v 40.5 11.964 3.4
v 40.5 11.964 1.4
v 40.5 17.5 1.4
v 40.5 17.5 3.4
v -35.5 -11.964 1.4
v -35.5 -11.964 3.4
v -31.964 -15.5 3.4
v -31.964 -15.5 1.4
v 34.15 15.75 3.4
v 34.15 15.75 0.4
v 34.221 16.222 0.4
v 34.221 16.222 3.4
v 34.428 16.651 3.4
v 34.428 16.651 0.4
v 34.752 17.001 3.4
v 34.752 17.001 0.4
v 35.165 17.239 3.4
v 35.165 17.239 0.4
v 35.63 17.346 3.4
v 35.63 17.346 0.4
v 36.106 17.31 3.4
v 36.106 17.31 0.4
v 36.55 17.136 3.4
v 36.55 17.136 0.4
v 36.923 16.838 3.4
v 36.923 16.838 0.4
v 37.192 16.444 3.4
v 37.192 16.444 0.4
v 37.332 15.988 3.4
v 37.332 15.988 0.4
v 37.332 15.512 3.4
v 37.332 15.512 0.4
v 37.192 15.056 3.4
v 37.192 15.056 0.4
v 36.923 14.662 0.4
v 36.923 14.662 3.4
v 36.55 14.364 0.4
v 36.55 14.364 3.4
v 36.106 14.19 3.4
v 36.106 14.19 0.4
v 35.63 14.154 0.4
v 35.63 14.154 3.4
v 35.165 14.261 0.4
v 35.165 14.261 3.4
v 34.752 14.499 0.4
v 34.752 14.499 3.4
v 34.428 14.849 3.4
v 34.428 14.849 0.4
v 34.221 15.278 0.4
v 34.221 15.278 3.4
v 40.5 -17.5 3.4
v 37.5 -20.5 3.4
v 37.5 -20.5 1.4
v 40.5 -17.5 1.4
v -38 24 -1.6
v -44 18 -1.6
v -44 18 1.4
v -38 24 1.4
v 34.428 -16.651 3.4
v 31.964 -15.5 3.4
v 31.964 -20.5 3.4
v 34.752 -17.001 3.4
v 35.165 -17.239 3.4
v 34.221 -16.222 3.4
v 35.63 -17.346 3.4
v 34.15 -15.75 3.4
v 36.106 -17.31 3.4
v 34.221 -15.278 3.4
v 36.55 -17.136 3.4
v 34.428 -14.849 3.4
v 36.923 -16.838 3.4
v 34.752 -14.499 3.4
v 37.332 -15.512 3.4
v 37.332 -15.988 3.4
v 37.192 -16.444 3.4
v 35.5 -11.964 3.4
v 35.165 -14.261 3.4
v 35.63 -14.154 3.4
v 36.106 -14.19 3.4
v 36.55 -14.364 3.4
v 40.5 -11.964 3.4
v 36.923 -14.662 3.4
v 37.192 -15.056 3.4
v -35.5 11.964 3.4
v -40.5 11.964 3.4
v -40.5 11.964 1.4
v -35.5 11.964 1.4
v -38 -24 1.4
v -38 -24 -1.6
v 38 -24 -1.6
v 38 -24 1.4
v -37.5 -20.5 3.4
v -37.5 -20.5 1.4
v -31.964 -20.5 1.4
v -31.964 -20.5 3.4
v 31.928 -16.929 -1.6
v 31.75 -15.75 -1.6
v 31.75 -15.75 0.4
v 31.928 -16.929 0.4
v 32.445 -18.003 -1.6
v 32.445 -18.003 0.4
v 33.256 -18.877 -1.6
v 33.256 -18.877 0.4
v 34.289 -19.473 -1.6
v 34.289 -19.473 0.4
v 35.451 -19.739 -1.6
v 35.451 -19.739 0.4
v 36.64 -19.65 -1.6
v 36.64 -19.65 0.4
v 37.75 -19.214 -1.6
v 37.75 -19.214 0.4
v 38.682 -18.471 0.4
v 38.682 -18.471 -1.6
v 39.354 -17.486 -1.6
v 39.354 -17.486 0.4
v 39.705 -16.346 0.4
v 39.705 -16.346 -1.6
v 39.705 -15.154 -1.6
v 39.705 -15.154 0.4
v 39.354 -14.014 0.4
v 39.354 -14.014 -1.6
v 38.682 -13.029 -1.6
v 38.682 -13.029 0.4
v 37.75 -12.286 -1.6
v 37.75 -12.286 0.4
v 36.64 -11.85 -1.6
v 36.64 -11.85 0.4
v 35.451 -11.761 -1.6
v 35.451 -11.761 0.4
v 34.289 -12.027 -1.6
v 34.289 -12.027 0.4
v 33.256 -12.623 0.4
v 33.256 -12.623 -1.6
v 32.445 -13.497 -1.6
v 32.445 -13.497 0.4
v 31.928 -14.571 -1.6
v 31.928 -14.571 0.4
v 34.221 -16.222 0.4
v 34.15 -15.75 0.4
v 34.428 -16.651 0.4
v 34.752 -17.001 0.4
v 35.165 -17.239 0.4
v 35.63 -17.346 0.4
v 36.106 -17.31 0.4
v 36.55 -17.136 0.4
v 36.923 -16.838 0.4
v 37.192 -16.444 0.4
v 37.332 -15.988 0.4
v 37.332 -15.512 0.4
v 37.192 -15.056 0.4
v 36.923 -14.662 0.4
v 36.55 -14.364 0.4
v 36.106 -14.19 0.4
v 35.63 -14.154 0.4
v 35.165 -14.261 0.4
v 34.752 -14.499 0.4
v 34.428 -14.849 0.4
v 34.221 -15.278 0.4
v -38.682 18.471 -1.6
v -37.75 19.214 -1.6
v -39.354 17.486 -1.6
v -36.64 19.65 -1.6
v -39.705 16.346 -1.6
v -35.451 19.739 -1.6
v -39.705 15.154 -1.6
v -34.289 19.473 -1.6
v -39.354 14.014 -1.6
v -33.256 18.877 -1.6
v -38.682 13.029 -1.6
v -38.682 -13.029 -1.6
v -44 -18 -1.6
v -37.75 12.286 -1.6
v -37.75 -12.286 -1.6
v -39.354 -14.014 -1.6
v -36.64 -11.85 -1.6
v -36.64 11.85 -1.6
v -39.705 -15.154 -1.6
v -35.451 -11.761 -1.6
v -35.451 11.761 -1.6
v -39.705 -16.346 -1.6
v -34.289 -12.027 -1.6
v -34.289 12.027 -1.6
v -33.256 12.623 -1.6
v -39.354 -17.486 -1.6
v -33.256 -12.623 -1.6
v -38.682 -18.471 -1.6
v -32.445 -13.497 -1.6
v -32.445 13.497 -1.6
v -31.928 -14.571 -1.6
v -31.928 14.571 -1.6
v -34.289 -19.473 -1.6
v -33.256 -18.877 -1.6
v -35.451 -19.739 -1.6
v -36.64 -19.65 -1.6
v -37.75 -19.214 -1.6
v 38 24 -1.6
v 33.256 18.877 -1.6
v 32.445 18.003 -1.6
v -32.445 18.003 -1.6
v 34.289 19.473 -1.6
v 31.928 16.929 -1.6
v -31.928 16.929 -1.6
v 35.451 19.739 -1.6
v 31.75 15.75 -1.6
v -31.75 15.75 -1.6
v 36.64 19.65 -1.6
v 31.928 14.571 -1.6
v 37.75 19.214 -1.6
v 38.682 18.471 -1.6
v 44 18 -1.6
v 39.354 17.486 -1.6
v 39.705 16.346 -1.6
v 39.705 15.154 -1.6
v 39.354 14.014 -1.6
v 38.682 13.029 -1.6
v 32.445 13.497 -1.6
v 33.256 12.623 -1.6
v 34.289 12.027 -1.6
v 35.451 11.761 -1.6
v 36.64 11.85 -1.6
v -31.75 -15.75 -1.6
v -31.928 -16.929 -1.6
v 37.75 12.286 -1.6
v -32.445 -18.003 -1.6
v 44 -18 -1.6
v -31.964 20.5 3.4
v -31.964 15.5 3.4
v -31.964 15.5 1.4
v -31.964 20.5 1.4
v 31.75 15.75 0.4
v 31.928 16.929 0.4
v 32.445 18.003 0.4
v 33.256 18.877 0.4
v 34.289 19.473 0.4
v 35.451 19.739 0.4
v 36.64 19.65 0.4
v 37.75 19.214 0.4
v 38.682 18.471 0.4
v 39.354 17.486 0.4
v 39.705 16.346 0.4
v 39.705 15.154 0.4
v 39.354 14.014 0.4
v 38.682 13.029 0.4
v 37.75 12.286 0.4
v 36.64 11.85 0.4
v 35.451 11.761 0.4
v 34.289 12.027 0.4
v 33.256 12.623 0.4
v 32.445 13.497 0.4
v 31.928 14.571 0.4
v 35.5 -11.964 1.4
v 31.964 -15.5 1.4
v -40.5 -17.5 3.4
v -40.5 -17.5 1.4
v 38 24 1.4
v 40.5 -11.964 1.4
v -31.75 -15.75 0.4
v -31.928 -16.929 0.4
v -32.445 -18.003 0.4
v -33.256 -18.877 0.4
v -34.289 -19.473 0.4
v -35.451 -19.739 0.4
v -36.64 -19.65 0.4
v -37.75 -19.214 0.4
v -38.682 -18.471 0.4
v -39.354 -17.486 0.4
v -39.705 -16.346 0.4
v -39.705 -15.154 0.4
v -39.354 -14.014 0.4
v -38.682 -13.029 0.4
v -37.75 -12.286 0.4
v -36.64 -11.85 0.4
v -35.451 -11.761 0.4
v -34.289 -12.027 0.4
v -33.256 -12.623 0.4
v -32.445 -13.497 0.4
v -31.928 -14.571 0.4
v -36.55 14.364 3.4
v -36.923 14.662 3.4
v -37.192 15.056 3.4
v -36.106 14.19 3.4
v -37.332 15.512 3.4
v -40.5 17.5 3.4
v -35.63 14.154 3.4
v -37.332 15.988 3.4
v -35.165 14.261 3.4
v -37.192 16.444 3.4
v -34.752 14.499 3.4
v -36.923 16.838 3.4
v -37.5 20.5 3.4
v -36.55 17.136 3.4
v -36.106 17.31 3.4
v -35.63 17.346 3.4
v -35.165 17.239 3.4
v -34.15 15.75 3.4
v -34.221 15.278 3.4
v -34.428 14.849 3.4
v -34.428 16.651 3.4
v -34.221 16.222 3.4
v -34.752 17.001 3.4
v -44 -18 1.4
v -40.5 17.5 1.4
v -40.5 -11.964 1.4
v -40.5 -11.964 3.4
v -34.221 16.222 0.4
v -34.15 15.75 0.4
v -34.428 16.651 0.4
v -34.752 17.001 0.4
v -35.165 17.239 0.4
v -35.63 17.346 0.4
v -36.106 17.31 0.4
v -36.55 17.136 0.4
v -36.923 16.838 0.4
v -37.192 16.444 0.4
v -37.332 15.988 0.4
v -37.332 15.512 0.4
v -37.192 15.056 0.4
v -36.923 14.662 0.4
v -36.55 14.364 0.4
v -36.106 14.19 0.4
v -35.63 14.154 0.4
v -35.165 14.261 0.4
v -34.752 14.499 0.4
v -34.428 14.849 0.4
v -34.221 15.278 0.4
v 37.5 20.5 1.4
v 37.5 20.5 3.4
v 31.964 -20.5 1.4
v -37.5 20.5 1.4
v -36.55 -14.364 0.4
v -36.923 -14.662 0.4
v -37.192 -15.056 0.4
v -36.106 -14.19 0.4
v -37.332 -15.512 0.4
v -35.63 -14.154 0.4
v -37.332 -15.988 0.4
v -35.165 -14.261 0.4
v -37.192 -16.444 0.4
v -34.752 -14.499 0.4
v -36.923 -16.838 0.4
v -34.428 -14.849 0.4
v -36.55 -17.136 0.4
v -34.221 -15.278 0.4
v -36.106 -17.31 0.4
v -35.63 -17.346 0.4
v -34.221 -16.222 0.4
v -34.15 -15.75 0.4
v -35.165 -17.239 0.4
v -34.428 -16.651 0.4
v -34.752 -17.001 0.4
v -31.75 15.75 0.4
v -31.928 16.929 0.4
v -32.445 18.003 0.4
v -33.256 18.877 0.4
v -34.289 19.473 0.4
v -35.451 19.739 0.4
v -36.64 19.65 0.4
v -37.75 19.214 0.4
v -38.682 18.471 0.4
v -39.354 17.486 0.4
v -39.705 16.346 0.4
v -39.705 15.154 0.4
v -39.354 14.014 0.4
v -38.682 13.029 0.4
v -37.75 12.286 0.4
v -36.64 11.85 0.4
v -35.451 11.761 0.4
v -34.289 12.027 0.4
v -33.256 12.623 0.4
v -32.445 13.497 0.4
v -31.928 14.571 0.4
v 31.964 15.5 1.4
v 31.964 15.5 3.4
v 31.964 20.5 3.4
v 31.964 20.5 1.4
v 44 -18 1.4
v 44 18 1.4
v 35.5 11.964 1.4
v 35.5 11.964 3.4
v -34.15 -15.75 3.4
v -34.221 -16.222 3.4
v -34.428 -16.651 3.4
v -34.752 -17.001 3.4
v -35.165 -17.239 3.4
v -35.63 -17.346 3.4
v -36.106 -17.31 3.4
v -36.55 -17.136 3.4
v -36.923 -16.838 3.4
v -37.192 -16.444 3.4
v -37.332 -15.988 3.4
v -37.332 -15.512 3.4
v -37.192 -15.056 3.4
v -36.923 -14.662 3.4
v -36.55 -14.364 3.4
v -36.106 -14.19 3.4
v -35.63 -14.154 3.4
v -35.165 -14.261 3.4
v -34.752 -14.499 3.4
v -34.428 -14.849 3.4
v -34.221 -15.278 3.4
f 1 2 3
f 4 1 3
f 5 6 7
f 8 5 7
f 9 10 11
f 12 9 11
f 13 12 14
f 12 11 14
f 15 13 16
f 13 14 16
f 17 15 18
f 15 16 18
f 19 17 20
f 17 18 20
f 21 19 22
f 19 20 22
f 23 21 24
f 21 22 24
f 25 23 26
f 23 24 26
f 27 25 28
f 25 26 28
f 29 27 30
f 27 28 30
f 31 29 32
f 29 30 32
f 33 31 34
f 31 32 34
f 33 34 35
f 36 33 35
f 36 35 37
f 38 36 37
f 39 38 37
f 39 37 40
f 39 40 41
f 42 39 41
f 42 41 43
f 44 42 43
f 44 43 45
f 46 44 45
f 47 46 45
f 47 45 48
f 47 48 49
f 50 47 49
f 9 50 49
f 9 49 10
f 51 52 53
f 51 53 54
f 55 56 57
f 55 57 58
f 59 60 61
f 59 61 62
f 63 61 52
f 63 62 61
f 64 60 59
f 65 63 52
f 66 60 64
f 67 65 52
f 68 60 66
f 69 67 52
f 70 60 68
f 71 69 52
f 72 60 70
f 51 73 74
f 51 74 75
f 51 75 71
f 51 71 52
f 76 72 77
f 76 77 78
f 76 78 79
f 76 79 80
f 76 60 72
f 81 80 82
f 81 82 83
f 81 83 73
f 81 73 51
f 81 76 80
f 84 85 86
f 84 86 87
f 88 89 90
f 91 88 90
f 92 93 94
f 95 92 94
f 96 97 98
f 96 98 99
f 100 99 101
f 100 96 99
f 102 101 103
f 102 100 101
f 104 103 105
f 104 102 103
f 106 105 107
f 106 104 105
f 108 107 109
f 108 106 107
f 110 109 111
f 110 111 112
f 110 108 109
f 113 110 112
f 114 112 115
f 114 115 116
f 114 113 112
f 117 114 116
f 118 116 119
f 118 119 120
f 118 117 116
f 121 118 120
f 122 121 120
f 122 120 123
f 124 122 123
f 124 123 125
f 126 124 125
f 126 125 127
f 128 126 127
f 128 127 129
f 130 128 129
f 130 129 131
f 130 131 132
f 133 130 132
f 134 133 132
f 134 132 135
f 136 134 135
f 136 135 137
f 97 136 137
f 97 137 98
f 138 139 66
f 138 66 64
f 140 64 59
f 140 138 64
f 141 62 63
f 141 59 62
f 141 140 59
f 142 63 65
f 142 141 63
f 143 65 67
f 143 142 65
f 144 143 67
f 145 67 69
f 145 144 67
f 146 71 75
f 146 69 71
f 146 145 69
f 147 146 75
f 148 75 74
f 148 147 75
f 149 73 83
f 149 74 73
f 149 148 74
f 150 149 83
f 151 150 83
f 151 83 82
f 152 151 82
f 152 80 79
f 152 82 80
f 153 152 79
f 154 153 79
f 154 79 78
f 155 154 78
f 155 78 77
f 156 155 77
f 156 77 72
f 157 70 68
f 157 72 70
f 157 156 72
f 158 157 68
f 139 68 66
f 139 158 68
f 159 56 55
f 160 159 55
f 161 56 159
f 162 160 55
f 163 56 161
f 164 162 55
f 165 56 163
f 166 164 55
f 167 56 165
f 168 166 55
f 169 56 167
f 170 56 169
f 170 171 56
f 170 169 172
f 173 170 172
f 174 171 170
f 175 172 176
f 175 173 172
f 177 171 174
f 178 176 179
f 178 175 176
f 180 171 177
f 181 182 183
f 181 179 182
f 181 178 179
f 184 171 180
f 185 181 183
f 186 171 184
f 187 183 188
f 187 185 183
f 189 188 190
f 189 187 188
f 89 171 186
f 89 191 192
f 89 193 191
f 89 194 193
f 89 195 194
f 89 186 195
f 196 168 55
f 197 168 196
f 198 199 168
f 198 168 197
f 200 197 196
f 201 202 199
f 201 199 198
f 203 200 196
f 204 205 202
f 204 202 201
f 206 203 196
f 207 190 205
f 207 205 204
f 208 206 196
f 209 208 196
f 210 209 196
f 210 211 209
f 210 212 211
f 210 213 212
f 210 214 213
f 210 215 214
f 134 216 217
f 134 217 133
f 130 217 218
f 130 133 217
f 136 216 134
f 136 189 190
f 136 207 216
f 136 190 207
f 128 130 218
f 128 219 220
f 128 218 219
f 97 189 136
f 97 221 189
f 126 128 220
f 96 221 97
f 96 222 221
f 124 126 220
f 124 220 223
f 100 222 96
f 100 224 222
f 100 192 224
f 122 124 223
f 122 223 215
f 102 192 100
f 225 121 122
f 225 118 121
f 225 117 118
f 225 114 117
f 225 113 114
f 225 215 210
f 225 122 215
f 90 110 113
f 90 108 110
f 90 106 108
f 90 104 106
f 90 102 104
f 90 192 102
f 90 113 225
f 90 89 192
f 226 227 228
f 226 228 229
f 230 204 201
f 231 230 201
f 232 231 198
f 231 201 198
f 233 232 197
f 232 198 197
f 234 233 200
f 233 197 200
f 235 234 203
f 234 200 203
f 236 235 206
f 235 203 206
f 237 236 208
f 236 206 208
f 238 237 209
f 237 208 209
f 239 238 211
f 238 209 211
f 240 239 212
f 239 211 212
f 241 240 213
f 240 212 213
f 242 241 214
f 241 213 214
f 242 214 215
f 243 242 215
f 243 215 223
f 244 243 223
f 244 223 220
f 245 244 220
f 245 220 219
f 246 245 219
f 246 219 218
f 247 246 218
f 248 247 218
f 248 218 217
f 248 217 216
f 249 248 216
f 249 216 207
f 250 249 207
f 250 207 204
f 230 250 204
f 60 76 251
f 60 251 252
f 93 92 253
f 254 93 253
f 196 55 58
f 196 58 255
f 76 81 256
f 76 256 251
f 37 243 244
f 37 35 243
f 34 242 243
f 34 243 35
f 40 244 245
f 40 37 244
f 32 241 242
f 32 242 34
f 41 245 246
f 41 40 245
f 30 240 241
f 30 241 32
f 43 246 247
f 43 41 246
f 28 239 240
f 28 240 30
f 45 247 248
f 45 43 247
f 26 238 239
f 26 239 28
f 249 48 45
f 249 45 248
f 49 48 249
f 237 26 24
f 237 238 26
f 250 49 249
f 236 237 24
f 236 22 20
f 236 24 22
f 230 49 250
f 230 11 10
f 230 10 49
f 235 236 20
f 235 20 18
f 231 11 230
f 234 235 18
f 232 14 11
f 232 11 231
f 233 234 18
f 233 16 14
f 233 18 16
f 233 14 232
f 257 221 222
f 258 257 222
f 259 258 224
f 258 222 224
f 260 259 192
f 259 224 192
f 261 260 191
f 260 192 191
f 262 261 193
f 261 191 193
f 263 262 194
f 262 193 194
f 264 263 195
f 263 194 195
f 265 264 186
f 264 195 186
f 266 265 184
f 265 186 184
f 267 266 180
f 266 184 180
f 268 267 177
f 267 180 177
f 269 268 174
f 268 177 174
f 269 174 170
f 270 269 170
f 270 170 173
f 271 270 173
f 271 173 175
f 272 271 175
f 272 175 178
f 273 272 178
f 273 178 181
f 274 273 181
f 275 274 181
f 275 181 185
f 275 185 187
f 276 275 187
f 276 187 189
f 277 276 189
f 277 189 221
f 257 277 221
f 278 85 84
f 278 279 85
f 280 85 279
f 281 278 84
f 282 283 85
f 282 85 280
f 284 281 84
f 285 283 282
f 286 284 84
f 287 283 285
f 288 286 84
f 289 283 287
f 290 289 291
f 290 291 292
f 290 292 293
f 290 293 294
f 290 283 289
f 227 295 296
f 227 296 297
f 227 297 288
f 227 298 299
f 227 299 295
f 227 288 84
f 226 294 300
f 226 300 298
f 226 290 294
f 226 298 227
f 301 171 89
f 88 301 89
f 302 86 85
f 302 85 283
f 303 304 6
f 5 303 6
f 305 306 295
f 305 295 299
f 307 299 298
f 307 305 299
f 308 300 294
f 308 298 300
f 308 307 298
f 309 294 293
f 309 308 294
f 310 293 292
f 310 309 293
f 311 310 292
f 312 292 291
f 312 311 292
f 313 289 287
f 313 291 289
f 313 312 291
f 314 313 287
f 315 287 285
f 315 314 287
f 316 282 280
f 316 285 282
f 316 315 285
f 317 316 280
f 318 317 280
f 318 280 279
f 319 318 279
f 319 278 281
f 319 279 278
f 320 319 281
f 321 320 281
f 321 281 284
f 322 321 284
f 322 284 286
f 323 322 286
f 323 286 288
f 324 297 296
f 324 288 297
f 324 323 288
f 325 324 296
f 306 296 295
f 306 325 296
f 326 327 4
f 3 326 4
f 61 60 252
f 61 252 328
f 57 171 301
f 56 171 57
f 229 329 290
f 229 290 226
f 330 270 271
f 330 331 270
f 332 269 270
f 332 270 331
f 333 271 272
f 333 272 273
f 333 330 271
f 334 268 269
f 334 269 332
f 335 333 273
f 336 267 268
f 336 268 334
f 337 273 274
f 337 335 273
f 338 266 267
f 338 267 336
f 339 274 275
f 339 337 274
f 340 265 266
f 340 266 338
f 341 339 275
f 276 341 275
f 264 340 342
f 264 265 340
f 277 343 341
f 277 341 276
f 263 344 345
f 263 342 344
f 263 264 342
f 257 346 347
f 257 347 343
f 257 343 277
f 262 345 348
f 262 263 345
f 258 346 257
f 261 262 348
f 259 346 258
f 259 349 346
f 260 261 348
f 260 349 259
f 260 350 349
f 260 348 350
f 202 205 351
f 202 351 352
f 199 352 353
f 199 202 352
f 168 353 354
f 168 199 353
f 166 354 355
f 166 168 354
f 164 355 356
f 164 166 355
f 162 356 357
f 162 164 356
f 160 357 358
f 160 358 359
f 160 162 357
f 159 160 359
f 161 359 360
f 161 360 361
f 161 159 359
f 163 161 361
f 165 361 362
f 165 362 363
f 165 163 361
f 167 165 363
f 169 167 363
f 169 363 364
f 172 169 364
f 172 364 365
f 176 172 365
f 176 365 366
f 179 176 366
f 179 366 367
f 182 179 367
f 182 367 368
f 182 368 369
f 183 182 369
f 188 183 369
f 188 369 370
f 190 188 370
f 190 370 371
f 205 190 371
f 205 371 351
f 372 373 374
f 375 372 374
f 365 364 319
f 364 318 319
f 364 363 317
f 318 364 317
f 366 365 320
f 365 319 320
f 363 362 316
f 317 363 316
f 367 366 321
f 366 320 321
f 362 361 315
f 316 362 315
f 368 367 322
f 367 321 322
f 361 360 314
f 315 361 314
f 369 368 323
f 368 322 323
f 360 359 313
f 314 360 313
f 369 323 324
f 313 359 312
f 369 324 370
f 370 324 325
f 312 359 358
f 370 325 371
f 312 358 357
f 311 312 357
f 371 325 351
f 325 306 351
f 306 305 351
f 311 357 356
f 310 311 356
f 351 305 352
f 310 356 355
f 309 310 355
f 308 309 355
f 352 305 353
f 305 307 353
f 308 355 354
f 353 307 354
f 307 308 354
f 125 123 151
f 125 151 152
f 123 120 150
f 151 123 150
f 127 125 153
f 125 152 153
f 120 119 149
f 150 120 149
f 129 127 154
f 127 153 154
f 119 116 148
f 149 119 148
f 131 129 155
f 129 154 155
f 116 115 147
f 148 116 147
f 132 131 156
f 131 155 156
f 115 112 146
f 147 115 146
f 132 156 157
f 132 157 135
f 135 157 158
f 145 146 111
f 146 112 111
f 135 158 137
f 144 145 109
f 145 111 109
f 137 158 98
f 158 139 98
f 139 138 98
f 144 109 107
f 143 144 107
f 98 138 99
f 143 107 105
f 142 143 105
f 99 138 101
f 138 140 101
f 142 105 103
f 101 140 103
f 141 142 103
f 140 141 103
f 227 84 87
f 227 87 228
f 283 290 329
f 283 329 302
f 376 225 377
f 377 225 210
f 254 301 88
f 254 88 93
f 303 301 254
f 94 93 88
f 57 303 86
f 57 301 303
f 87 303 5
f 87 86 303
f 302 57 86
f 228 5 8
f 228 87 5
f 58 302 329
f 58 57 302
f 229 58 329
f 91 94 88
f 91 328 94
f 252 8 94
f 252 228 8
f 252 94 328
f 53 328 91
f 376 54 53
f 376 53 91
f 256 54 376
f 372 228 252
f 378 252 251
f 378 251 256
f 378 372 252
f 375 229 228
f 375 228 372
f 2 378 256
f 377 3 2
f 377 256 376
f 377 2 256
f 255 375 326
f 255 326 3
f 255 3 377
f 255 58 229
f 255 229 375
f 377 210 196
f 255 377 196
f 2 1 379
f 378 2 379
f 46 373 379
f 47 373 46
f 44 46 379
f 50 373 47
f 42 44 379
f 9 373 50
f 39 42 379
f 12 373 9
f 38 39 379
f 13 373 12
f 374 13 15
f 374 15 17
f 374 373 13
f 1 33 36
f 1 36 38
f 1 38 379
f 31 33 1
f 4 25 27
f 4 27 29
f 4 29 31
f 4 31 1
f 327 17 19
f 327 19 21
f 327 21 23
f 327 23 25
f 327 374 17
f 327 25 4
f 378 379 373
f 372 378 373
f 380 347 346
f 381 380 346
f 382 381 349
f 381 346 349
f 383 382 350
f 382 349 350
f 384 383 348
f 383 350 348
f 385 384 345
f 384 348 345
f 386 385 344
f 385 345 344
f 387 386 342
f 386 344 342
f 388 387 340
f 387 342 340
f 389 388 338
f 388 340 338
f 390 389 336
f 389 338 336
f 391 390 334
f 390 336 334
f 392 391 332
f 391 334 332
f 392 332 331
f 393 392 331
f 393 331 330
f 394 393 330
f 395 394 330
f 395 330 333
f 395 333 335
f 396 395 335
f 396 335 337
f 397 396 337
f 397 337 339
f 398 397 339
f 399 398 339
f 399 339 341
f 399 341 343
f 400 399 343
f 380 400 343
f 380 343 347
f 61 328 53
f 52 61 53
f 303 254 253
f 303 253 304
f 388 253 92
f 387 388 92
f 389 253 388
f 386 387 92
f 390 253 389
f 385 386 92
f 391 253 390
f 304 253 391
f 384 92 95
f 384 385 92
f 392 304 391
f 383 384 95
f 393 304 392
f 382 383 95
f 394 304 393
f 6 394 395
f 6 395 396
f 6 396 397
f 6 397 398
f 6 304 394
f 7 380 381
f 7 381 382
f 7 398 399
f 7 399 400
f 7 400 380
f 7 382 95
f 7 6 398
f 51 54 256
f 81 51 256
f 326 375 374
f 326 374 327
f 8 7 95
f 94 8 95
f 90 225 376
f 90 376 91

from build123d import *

# Parameters (mm, degrees)
SKETCH012_W                   = 88
SKETCH012_H                   = 48
PAD005_DEPTH                  = 4
SKETCH013_W                   = 81
SKETCH013_H                   = 41
PAD006_DEPTH                  = 2
POCKET007_DEPTH               = 2
POCKET007_MIRRORED009_2_DEPTH = 2
POCKET008_DEPTH               = 2
SKETCH016_R                   = 1.6
POCKET009_DEPTH               = 206.8392433701
SKETCH016_MIRRORED011_2_R     = 1.6
POCKET009_MIRRORED011_2_DEPTH = 206.8392433701
SKETCH017_R                   = 4
POCKET010_DEPTH               = 3
SKETCH017_MIRRORED013_2_R     = 4
POCKET010_MIRRORED013_2_DEPTH = 3
SKETCH018_W                   = 100.342552
SKETCH018_H                   = 57.696968
POCKET011_DEPTH               = 1
POCKET012_DEPTH               = 205.7296725906
POCKET012_MIRRORED015_2_DEPTH = 205.7296725906
POCKET008_MIRRORED017_2_DEPTH = 2


with BuildPart() as part:
    # Sketch012 → Pad005 (new body)
    with BuildSketch(Plane.XY):
        Rectangle(SKETCH012_W, SKETCH012_H)
    extrude(amount=PAD005_DEPTH)

    # Sketch013 (on Face6 of Pad005) → Pad006 (join)
    with BuildSketch(Plane.XY.offset(4)):
        Rectangle(SKETCH013_W, SKETCH013_H)
    extrude(amount=PAD006_DEPTH)

    # Sketch014 (on Face11 of Pad006) → Pocket007 (cut)
    with BuildSketch(Plane.XY.offset(6)):
        Polygon((0, 0), (-40.5, 0), (-40.5, 11.9644660941), (-35.5, 11.9644660941), (-31.964466094, 15.5), (-31.964466094, 20.5), (0, 20.5), align=None)
    pocket007 = extrude(amount=-POCKET007_DEPTH, mode=Mode.SUBTRACT)

    # Sketch014 Mirrored009 2 → Pocket007 Mirrored009 2 (cut)
    with BuildSketch(Plane(origin=(0, 0, 6), x_dir=(-1, 0, 0), z_dir=(0, 0, -1))):
        Polygon((0, 0), (-40.5, 0), (-40.5, 11.9644660941), (-35.5, 11.9644660941), (-31.964466094, 15.5), (-31.964466094, 20.5), (0, 20.5), align=None)
    pocket007_mirrored009_2 = extrude(amount=POCKET007_MIRRORED009_2_DEPTH, mode=Mode.SUBTRACT)

    # Mirrored010: Pocket007, Pocket007 Mirrored009 2 across Sketch014 H_Axis
    add(pocket007.mirror(Plane(origin=(0, 0, 6), x_dir=(0, 0, 1), z_dir=(0, 1, 0))), mode=Mode.SUBTRACT)
    add(pocket007_mirrored009_2.mirror(Plane(origin=(0, 0, 6), x_dir=(0, 0, 1), z_dir=(0, 1, 0))), mode=Mode.SUBTRACT)

    # Sketch015 (on Face20 of MultiTransform004) → Pocket008 (cut)
    with BuildSketch(Plane.XY.offset(6)):
        Polygon((-40.5, 17.5), (-40.5, 20.5), (-37.5, 20.5), align=None)
    pocket008 = extrude(amount=-POCKET008_DEPTH, mode=Mode.SUBTRACT)

    # Sketch016 (on Face4 of Pocket008) → Pocket009 (cut, through all)
    with BuildSketch(Plane(origin=(0, 0, 0), x_dir=(1, 0, 0), z_dir=(0, 0, -1))):
        with Locations((-35.75, 15.75)):
            Circle(SKETCH016_R)
    pocket009 = extrude(amount=-POCKET009_DEPTH, mode=Mode.SUBTRACT)

    # Sketch016 Mirrored011 2 → Pocket009 Mirrored011 2 (cut, through all)
    with BuildSketch(Plane(origin=(0, 0, 0), x_dir=(-1, 0, 0), z_dir=(0, 0, 1))):
        with Locations((-35.75, 15.75)):
            Circle(SKETCH016_MIRRORED011_2_R)
    pocket009_mirrored011_2 = extrude(amount=POCKET009_MIRRORED011_2_DEPTH, mode=Mode.SUBTRACT)

    # Mirrored012: Pocket009, Pocket009 Mirrored011 2 across Sketch016 H_Axis
    add(pocket009.mirror(Plane(origin=(0, 0, 0), x_dir=(0, 0, -1), z_dir=(0, -1, 0))), mode=Mode.SUBTRACT)
    add(pocket009_mirrored011_2.mirror(Plane(origin=(0, 0, 0), x_dir=(0, 0, -1), z_dir=(0, -1, 0))), mode=Mode.SUBTRACT)

    # Sketch017 (on Face4 of MultiTransform005) → Pocket010 (cut)
    with BuildSketch(Plane(origin=(0, 0, 0), x_dir=(1, 0, 0), z_dir=(0, 0, -1))):
        with Locations((-35.75, 15.75)):
            Circle(SKETCH017_R)
    pocket010 = extrude(amount=-POCKET010_DEPTH, mode=Mode.SUBTRACT)

    # Sketch017 Mirrored013 2 → Pocket010 Mirrored013 2 (cut)
    with BuildSketch(Plane(origin=(0, 0, 0), x_dir=(-1, 0, 0), z_dir=(0, 0, 1))):
        with Locations((-35.75, 15.75)):
            Circle(SKETCH017_MIRRORED013_2_R)
    pocket010_mirrored013_2 = extrude(amount=POCKET010_MIRRORED013_2_DEPTH, mode=Mode.SUBTRACT)

    # Mirrored014: Pocket010, Pocket010 Mirrored013 2 across Sketch017 H_Axis
    add(pocket010.mirror(Plane(origin=(0, 0, 0), x_dir=(0, 0, -1), z_dir=(0, -1, 0))), mode=Mode.SUBTRACT)
    add(pocket010_mirrored013_2.mirror(Plane(origin=(0, 0, 0), x_dir=(0, 0, -1), z_dir=(0, -1, 0))), mode=Mode.SUBTRACT)

    # Sketch018 (on Face4 of MultiTransform006) → Pocket011 (cut)
    with BuildSketch(Plane(origin=(0, 0, 0), x_dir=(1, 0, 0), z_dir=(0, 0, -1))):
        with Locations((-0.467655, 0.399981)):
            Rectangle(SKETCH018_W, SKETCH018_H)
    extrude(amount=-POCKET011_DEPTH, mode=Mode.SUBTRACT)

    # Sketch019 (on Face2 of Pocket011) → Pocket012 (cut, through all)
    with BuildSketch(Plane(origin=(0, 0, 1), x_dir=(1, 0, 0), z_dir=(0, 0, -1))):
        Polygon((-44, 18), (-38, 24), (-44, 24), align=None)
    pocket012 = extrude(amount=-POCKET012_DEPTH, mode=Mode.SUBTRACT)

    # Sketch019 Mirrored015 2 → Pocket012 Mirrored015 2 (cut, through all)
    with BuildSketch(Plane(origin=(0, 0, 1), x_dir=(-1, 0, 0), z_dir=(0, 0, 1))):
        Polygon((-44, 18), (-38, 24), (-44, 24), align=None)
    pocket012_mirrored015_2 = extrude(amount=POCKET012_MIRRORED015_2_DEPTH, mode=Mode.SUBTRACT)

    # Mirrored016: Pocket012, Pocket012 Mirrored015 2 across Sketch019 H_Axis
    add(pocket012.mirror(Plane(origin=(0, 0, 1), x_dir=(0, 0, -1), z_dir=(0, -1, 0))), mode=Mode.SUBTRACT)
    add(pocket012_mirrored015_2.mirror(Plane(origin=(0, 0, 1), x_dir=(0, 0, -1), z_dir=(0, -1, 0))), mode=Mode.SUBTRACT)

    # Sketch015 Mirrored017 2 → Pocket008 Mirrored017 2 (cut)
    with BuildSketch(Plane(origin=(0, 0, 6), x_dir=(-1, 0, 0), z_dir=(0, 0, -1))):
        Polygon((-40.5, 17.5), (-40.5, 20.5), (-37.5, 20.5), align=None)
    pocket008_mirrored017_2 = extrude(amount=POCKET008_MIRRORED017_2_DEPTH, mode=Mode.SUBTRACT)

    # Mirrored018: Pocket008, Pocket008 Mirrored017 2 across Sketch015 H_Axis
    add(pocket008.mirror(Plane(origin=(0, 0, 6), x_dir=(0, 0, 1), z_dir=(0, 1, 0))), mode=Mode.SUBTRACT)
    add(pocket008_mirrored017_2.mirror(Plane(origin=(0, 0, 6), x_dir=(0, 0, 1), z_dir=(0, 1, 0))), mode=Mode.SUBTRACT)


with BuildPart() as part_1:
    # Body001 placement: moved
    add(part.part.moved(Location((0, 0, -2.6))))


solid = part_1.part
